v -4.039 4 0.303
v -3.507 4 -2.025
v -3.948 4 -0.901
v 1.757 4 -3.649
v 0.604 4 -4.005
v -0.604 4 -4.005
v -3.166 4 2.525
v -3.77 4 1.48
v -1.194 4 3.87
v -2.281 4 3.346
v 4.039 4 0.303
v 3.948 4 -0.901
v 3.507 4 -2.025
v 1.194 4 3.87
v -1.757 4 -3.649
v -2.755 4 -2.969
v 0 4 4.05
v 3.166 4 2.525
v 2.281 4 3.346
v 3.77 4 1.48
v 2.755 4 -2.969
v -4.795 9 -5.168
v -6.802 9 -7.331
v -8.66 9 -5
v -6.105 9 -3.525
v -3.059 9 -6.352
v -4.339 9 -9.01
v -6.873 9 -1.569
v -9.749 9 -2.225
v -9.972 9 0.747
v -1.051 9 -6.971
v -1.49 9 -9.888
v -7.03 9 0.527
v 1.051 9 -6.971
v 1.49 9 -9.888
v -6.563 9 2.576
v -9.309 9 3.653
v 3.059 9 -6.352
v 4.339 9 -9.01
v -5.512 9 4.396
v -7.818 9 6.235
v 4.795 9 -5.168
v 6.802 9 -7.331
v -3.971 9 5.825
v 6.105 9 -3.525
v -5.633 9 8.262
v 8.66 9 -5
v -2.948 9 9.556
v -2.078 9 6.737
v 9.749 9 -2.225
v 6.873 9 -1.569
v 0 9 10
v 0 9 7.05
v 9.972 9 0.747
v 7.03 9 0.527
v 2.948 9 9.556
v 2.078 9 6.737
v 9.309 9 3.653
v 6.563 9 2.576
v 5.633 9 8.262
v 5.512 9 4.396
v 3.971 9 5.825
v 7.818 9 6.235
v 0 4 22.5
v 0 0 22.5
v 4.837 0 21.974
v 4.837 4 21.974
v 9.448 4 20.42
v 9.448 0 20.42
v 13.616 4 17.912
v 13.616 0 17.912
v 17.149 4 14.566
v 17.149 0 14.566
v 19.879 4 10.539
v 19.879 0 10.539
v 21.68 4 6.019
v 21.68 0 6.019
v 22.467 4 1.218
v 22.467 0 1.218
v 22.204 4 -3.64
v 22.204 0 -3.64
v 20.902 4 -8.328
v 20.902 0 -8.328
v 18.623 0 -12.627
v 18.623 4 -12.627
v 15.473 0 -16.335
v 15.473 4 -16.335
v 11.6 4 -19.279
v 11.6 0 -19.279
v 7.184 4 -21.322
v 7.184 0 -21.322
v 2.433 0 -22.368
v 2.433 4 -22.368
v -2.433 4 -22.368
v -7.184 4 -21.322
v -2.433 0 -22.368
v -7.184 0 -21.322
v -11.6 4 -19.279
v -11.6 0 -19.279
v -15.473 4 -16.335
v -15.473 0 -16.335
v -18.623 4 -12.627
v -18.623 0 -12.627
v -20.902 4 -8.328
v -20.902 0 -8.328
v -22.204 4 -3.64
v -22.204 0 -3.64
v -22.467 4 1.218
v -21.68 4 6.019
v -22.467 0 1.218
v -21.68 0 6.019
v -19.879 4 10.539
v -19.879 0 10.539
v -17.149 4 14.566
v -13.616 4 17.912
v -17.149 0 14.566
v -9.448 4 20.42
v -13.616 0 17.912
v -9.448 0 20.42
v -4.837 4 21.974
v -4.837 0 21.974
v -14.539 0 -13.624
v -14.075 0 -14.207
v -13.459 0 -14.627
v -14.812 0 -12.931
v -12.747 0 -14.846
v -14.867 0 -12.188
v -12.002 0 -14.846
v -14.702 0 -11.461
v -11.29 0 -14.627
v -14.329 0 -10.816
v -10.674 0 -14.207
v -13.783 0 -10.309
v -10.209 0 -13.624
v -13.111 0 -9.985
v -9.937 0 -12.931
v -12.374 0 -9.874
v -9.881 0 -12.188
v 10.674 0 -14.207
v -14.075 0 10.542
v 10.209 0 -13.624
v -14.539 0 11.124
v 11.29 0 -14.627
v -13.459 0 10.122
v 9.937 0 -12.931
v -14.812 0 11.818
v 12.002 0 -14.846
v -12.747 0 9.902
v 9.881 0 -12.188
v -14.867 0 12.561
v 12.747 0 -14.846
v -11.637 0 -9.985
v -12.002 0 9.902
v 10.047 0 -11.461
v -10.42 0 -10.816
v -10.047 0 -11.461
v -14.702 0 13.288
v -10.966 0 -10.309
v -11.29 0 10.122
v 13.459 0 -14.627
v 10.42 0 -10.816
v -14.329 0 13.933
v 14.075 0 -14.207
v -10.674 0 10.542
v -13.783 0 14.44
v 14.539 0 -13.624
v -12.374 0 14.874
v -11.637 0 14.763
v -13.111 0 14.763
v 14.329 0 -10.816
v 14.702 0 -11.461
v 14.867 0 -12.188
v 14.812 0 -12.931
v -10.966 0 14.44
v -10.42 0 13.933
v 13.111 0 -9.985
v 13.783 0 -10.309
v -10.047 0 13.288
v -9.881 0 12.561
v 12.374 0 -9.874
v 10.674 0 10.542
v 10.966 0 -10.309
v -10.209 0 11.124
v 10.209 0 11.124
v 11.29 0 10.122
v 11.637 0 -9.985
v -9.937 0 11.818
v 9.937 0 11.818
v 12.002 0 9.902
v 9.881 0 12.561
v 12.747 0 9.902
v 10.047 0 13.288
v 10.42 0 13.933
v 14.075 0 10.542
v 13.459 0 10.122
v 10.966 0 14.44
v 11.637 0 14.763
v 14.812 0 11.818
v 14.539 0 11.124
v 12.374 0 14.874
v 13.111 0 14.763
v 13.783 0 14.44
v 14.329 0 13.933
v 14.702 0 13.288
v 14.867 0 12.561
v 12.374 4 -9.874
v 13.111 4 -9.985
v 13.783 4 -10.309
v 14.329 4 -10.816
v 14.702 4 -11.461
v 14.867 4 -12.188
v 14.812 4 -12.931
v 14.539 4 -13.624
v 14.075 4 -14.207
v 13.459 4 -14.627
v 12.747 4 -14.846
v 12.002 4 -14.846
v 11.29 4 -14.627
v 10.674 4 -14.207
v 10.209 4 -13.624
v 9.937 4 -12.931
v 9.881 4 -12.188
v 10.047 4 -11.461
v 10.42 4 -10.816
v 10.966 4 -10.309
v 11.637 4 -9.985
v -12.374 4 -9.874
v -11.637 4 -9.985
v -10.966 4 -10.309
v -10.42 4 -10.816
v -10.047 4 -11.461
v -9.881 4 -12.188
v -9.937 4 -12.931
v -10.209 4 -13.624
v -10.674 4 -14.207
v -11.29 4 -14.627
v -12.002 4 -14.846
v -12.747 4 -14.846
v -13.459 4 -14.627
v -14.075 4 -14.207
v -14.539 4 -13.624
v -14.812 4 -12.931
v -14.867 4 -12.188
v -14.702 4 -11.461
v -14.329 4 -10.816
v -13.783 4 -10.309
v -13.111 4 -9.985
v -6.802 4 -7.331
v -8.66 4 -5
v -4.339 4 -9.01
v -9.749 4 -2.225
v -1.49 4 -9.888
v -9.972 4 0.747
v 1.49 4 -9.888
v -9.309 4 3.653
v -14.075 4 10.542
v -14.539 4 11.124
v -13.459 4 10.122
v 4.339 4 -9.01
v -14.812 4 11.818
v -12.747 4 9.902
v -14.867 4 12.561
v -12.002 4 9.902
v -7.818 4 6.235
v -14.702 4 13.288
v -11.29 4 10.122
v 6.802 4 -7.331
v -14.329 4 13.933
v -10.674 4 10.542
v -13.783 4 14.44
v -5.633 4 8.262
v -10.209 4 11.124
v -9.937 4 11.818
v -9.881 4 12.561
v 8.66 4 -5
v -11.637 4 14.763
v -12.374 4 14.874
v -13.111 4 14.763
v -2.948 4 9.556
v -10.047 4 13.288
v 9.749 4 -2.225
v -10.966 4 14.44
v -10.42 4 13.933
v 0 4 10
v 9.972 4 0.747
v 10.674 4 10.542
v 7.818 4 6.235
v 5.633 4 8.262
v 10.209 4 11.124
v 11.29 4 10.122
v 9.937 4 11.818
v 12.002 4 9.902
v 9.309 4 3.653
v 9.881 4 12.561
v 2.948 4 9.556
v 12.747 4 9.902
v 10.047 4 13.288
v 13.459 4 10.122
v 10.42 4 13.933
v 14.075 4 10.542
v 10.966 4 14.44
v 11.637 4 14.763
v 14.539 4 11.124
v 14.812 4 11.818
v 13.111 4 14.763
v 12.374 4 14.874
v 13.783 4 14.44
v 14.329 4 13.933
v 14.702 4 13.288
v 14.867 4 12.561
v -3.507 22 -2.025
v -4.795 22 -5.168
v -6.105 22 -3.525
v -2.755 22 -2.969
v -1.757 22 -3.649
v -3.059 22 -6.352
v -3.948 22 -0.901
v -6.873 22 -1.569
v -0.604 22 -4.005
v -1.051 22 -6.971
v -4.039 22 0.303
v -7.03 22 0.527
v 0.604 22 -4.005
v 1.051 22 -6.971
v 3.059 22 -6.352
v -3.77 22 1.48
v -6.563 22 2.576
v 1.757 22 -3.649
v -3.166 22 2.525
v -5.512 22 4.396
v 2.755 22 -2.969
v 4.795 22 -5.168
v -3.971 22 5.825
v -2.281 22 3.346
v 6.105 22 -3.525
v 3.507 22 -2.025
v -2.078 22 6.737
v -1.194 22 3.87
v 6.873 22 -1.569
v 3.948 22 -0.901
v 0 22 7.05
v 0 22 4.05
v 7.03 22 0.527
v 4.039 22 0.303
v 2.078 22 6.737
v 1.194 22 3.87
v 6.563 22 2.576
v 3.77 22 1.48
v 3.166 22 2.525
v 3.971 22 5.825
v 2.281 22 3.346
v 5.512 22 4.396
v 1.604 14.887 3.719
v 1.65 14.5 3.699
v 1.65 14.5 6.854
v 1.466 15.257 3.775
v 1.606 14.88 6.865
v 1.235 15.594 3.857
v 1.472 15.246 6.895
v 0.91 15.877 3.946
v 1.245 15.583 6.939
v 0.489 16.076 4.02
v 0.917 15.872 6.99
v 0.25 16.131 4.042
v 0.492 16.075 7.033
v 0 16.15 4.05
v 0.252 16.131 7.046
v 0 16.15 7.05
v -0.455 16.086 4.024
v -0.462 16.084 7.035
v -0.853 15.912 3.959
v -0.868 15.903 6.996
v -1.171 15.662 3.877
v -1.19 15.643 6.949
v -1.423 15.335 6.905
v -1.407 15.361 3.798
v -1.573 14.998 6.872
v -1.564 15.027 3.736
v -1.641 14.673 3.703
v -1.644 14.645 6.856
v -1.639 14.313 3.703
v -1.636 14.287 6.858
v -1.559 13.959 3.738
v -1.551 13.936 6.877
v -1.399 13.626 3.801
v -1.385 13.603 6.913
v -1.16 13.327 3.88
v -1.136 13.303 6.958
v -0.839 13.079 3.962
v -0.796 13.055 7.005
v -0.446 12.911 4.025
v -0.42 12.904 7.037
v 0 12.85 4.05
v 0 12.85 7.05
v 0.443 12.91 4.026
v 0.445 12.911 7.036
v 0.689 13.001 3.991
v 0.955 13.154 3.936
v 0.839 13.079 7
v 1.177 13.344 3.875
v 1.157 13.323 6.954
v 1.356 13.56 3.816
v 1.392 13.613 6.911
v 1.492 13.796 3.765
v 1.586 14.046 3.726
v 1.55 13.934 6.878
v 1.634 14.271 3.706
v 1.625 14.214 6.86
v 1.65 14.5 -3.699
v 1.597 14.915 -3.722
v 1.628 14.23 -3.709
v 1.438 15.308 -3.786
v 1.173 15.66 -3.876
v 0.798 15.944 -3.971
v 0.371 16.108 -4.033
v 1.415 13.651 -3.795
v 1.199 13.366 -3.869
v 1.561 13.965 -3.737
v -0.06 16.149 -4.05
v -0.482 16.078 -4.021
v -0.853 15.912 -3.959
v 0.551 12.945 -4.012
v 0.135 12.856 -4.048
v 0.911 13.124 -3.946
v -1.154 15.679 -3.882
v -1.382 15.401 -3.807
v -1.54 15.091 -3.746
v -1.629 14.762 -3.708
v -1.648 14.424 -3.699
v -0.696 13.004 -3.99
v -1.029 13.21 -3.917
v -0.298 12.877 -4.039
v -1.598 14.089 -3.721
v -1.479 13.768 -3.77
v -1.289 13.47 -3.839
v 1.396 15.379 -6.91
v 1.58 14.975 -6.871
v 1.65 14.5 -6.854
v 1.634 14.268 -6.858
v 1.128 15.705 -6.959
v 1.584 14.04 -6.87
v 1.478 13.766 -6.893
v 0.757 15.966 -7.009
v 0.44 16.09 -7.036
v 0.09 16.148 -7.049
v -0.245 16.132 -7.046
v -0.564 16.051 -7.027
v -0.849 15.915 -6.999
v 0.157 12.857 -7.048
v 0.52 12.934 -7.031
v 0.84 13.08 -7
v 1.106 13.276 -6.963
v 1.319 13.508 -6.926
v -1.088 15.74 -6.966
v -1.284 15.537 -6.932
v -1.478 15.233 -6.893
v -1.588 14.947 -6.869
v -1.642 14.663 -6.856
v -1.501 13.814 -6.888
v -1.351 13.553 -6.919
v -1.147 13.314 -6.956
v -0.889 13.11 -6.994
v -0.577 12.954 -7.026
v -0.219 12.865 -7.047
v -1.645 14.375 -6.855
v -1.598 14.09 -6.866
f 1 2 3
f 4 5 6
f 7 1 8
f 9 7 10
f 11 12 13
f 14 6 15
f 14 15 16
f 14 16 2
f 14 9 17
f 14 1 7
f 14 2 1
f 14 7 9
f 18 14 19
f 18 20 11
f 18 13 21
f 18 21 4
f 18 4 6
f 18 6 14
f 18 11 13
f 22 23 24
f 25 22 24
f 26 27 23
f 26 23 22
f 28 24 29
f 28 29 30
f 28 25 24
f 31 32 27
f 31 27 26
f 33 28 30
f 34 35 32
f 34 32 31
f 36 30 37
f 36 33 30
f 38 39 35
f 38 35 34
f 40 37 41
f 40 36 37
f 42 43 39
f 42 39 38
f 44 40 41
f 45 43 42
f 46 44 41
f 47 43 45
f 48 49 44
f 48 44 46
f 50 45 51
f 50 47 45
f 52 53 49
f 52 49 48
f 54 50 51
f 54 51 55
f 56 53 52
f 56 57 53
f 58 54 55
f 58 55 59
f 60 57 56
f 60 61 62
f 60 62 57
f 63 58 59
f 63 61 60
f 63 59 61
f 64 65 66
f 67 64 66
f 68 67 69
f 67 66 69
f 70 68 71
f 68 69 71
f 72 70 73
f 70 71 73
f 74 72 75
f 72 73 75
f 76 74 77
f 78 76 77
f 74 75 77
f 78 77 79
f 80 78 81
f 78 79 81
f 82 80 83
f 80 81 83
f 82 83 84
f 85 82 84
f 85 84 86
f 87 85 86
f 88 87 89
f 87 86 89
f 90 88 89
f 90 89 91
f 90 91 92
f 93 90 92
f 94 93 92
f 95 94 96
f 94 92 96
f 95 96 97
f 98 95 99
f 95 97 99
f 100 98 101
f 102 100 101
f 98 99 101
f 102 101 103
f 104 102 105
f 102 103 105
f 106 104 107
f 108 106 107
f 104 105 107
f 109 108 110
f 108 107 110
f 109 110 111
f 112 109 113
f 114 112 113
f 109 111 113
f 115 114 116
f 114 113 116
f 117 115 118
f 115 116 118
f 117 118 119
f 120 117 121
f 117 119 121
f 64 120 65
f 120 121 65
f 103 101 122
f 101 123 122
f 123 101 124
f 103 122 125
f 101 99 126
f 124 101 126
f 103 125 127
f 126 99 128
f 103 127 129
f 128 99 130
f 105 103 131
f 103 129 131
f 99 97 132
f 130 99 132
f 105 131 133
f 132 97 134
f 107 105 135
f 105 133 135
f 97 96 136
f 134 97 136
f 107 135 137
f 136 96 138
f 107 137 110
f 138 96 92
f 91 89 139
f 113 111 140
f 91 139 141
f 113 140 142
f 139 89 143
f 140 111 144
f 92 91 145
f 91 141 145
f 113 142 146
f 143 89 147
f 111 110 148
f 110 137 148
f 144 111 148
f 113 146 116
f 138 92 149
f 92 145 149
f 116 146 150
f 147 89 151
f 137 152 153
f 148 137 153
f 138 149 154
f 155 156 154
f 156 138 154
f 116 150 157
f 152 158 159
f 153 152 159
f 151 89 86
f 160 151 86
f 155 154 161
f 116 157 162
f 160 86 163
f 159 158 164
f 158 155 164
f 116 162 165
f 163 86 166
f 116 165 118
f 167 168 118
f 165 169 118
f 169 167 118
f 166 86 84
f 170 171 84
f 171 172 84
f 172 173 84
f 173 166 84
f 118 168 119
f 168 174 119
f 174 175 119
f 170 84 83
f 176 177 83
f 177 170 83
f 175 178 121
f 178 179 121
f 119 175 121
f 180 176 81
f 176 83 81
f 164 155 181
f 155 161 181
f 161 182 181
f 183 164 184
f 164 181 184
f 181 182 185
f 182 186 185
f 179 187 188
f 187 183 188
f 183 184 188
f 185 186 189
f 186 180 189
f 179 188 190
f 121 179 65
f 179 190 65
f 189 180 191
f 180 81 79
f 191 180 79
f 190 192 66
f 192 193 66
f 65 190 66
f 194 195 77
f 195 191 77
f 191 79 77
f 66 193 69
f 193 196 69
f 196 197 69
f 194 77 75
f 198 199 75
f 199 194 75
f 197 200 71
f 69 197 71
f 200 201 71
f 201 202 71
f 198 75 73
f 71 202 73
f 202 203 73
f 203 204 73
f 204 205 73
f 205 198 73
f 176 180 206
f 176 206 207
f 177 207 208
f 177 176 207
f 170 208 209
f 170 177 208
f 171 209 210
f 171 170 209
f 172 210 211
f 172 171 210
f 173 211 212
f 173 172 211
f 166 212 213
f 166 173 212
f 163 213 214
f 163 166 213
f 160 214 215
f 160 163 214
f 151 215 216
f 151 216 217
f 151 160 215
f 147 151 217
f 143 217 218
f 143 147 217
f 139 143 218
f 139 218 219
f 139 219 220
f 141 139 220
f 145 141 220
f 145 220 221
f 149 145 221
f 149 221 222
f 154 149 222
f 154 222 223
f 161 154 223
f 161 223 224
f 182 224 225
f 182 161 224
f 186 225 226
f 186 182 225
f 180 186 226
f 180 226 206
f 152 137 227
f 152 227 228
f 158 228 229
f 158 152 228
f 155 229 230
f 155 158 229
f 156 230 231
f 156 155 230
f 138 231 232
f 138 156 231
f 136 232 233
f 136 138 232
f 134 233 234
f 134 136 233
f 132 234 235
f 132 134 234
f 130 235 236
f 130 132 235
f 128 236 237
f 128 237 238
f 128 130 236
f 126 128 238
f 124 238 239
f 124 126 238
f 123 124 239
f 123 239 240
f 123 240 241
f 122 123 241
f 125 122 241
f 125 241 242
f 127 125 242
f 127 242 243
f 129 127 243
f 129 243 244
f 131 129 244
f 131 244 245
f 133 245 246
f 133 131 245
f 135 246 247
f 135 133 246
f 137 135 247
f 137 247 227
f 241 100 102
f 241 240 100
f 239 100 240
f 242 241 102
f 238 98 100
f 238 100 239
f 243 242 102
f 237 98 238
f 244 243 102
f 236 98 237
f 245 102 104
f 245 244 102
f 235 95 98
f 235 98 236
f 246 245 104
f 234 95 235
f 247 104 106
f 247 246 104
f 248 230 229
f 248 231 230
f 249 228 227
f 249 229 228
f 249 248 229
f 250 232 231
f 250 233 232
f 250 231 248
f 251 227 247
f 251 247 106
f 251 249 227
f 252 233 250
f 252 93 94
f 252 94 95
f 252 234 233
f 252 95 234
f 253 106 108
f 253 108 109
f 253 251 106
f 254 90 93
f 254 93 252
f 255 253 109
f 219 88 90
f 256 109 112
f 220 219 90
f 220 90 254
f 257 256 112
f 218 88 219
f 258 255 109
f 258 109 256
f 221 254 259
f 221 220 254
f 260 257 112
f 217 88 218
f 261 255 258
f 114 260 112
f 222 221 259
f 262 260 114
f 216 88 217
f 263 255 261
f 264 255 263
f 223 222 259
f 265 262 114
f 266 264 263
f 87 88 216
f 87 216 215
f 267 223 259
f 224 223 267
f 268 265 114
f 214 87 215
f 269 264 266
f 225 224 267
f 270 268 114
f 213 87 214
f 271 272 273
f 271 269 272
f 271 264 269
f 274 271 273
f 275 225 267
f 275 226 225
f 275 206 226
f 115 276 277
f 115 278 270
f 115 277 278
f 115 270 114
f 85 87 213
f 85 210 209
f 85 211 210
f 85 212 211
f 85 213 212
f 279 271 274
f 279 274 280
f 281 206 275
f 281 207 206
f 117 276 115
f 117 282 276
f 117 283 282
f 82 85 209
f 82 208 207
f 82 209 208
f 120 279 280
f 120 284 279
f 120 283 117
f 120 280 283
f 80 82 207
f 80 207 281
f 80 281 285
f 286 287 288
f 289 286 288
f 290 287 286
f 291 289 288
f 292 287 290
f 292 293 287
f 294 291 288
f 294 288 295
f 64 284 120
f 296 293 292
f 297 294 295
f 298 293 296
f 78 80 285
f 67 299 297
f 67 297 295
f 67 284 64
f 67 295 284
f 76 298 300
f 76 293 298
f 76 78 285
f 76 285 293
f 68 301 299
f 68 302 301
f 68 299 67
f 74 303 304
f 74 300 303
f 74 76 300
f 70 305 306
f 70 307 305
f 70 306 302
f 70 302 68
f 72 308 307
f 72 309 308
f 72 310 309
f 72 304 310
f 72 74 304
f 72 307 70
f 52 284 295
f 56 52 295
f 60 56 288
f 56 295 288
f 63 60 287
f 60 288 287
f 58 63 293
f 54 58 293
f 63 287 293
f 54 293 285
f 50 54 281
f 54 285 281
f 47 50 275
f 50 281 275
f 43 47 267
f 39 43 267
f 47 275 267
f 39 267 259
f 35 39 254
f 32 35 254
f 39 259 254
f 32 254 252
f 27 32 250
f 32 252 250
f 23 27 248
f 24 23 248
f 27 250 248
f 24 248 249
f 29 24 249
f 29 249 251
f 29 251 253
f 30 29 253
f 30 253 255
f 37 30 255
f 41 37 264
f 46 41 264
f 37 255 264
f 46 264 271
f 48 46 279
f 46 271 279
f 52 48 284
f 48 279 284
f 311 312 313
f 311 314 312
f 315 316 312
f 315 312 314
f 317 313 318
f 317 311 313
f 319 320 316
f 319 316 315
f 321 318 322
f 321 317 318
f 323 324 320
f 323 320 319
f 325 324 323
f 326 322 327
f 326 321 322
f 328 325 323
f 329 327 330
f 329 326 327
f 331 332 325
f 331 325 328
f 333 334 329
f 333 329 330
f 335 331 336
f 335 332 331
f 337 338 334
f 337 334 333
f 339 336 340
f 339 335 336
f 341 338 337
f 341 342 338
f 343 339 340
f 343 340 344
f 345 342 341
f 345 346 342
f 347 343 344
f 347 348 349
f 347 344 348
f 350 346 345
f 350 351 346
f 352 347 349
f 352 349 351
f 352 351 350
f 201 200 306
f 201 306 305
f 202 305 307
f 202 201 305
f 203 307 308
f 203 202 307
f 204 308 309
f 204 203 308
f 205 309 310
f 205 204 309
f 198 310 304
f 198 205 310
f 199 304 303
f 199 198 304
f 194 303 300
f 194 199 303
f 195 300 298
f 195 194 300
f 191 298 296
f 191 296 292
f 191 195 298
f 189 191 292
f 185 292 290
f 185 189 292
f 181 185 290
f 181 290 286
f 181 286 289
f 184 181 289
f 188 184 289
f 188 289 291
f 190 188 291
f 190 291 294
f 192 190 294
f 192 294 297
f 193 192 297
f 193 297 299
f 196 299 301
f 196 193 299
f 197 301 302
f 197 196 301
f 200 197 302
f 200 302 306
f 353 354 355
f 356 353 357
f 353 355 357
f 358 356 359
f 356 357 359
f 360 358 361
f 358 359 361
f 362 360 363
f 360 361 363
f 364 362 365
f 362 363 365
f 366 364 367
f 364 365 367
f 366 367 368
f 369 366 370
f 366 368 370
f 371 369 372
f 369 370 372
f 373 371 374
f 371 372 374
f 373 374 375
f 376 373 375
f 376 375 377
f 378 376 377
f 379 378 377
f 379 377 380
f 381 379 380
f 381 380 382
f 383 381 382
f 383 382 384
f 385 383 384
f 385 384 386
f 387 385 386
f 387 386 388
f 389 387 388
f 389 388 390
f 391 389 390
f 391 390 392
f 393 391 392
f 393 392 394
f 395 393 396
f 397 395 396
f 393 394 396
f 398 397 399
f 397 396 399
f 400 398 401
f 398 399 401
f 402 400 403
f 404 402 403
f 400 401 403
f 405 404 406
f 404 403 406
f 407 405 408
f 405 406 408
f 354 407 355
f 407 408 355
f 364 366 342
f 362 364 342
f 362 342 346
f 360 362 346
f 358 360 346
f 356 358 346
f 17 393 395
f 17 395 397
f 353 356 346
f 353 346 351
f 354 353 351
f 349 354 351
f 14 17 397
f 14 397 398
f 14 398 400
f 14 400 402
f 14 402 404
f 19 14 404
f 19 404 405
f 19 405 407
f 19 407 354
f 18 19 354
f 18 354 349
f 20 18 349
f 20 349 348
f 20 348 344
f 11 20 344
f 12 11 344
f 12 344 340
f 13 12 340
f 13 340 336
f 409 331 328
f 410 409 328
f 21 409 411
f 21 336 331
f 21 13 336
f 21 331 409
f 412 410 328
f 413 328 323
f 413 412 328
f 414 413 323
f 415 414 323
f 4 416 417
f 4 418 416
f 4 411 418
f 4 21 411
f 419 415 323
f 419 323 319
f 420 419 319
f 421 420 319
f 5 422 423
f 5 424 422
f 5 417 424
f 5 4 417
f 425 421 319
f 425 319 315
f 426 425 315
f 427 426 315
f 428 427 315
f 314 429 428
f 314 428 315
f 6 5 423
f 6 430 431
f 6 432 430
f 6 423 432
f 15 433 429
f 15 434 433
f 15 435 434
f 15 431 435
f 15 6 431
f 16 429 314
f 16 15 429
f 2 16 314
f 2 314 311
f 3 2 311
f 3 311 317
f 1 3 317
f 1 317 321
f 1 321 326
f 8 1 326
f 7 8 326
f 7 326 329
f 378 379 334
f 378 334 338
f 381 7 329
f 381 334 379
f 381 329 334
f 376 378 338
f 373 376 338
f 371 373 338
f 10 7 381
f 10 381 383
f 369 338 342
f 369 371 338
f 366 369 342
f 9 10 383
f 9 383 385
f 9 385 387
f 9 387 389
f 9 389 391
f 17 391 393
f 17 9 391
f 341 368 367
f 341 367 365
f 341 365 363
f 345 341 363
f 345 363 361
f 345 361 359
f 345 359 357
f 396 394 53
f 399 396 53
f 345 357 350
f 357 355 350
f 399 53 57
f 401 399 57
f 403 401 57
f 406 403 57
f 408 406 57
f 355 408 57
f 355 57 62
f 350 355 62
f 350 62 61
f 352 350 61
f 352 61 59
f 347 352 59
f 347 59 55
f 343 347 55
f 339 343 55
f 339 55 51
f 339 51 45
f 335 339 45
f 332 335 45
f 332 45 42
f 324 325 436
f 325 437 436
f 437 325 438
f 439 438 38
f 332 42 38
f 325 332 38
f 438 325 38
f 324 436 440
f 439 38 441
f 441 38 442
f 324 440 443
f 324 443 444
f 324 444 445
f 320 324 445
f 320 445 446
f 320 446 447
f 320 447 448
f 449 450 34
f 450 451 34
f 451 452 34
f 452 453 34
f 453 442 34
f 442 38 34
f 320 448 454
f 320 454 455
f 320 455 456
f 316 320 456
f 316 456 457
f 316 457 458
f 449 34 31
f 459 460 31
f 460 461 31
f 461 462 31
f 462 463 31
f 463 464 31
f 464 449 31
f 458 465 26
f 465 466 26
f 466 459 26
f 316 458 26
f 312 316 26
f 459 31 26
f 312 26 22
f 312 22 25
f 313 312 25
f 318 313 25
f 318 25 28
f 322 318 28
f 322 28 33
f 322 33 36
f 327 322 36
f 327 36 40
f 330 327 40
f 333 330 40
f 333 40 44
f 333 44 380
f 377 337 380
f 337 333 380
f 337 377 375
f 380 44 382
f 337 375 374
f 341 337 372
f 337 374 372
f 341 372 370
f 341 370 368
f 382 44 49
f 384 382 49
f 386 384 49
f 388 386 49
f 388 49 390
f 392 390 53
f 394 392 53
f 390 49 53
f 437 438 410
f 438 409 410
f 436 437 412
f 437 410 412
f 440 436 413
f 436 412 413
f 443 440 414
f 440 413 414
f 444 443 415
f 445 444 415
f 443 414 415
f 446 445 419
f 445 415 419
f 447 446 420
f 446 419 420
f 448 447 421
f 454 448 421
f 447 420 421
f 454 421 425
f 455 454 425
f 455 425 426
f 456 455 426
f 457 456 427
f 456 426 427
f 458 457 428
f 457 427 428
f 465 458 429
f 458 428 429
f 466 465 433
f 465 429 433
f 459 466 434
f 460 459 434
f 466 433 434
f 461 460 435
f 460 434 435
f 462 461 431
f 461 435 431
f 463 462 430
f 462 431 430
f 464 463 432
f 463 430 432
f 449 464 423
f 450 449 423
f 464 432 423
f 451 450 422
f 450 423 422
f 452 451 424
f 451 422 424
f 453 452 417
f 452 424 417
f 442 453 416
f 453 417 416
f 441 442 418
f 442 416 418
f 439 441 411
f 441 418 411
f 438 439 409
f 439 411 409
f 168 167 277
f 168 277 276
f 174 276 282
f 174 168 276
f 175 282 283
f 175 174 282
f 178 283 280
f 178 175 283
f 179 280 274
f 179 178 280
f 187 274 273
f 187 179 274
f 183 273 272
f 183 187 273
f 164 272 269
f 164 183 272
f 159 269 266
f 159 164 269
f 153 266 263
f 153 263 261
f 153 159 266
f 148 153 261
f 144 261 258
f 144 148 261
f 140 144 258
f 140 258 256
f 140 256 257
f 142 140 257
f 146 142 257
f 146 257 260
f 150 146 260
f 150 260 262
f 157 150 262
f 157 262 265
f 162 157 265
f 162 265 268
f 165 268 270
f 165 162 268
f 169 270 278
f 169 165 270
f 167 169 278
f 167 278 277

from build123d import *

# Parameters (mm, degrees)
SKETCH1_R           = 22.5
SKETCH1_R_2         = 2.5
BOSS_EXTRUDE1_DEPTH = 4
SKETCH2_R           = 7.05
SKETCH2_R_2         = 4.05
BOSS_EXTRUDE2_DEPTH = 18
SKETCH3_R           = 1.65
CUT_EXTRUDE1_DEPTH  = 9
SKETCH4_R           = 10
SKETCH4_R_2         = 7
BOSS_EXTRUDE3_DEPTH = 5


with BuildPart() as part:
    # Sketch1 → Boss-Extrude1 (new body)
    with BuildSketch(Plane(origin=(0, 0, 0), x_dir=(1, 0, 0), z_dir=(0, 1, 0))):
        with Locations(Location((0, 0, 0), (0, 0, 270))):
            Circle(SKETCH1_R)
        with Locations(Location((-12.374368671, 12.374368671, 0), (0, 0, 270))):
            Circle(SKETCH1_R_2, mode=Mode.SUBTRACT)
        with Locations(Location((12.374368671, 12.374368671, 0), (0, 0, 270))):
            Circle(SKETCH1_R_2, mode=Mode.SUBTRACT)
        with Locations(Location((12.374368671, -12.374368671, 0), (0, 0, 270))):
            Circle(SKETCH1_R_2, mode=Mode.SUBTRACT)
        with Locations(Location((-12.374368671, -12.374368671, 0), (0, 0, 270))):
            Circle(SKETCH1_R_2, mode=Mode.SUBTRACT)
    extrude(amount=BOSS_EXTRUDE1_DEPTH)

    # Sketch2 → Boss-Extrude2 (add)
    with BuildSketch(Plane(origin=(0, 4, 0), x_dir=(1, 0, 0), z_dir=(0, 1, 0))):
        with Locations(Location((0, 0, 0), (0, 0, 270))):
            Circle(SKETCH2_R)
        with Locations(Location((0, 0, 0), (0, 0, 270))):
            Circle(SKETCH2_R_2, mode=Mode.SUBTRACT)
    extrude(amount=BOSS_EXTRUDE2_DEPTH)

    # Sketch3 → Cut-Extrude1 (cut, symmetric)
    with BuildSketch(Plane.XY):
        with Locations((0, 14.5)):
            Circle(SKETCH3_R)
    extrude(amount=CUT_EXTRUDE1_DEPTH, both=True, mode=Mode.SUBTRACT)

    # Sketch4 → Boss-Extrude3 (add)
    with BuildSketch(Plane(origin=(0, 4, 0), x_dir=(1, 0, 0), z_dir=(0, 1, 0))):
        with Locations(Location((0, 0, 0), (0, 0, 270))):
            Circle(SKETCH4_R)
        Circle(SKETCH4_R_2, mode=Mode.SUBTRACT)
    extrude(amount=BOSS_EXTRUDE3_DEPTH)


solid = part.part
